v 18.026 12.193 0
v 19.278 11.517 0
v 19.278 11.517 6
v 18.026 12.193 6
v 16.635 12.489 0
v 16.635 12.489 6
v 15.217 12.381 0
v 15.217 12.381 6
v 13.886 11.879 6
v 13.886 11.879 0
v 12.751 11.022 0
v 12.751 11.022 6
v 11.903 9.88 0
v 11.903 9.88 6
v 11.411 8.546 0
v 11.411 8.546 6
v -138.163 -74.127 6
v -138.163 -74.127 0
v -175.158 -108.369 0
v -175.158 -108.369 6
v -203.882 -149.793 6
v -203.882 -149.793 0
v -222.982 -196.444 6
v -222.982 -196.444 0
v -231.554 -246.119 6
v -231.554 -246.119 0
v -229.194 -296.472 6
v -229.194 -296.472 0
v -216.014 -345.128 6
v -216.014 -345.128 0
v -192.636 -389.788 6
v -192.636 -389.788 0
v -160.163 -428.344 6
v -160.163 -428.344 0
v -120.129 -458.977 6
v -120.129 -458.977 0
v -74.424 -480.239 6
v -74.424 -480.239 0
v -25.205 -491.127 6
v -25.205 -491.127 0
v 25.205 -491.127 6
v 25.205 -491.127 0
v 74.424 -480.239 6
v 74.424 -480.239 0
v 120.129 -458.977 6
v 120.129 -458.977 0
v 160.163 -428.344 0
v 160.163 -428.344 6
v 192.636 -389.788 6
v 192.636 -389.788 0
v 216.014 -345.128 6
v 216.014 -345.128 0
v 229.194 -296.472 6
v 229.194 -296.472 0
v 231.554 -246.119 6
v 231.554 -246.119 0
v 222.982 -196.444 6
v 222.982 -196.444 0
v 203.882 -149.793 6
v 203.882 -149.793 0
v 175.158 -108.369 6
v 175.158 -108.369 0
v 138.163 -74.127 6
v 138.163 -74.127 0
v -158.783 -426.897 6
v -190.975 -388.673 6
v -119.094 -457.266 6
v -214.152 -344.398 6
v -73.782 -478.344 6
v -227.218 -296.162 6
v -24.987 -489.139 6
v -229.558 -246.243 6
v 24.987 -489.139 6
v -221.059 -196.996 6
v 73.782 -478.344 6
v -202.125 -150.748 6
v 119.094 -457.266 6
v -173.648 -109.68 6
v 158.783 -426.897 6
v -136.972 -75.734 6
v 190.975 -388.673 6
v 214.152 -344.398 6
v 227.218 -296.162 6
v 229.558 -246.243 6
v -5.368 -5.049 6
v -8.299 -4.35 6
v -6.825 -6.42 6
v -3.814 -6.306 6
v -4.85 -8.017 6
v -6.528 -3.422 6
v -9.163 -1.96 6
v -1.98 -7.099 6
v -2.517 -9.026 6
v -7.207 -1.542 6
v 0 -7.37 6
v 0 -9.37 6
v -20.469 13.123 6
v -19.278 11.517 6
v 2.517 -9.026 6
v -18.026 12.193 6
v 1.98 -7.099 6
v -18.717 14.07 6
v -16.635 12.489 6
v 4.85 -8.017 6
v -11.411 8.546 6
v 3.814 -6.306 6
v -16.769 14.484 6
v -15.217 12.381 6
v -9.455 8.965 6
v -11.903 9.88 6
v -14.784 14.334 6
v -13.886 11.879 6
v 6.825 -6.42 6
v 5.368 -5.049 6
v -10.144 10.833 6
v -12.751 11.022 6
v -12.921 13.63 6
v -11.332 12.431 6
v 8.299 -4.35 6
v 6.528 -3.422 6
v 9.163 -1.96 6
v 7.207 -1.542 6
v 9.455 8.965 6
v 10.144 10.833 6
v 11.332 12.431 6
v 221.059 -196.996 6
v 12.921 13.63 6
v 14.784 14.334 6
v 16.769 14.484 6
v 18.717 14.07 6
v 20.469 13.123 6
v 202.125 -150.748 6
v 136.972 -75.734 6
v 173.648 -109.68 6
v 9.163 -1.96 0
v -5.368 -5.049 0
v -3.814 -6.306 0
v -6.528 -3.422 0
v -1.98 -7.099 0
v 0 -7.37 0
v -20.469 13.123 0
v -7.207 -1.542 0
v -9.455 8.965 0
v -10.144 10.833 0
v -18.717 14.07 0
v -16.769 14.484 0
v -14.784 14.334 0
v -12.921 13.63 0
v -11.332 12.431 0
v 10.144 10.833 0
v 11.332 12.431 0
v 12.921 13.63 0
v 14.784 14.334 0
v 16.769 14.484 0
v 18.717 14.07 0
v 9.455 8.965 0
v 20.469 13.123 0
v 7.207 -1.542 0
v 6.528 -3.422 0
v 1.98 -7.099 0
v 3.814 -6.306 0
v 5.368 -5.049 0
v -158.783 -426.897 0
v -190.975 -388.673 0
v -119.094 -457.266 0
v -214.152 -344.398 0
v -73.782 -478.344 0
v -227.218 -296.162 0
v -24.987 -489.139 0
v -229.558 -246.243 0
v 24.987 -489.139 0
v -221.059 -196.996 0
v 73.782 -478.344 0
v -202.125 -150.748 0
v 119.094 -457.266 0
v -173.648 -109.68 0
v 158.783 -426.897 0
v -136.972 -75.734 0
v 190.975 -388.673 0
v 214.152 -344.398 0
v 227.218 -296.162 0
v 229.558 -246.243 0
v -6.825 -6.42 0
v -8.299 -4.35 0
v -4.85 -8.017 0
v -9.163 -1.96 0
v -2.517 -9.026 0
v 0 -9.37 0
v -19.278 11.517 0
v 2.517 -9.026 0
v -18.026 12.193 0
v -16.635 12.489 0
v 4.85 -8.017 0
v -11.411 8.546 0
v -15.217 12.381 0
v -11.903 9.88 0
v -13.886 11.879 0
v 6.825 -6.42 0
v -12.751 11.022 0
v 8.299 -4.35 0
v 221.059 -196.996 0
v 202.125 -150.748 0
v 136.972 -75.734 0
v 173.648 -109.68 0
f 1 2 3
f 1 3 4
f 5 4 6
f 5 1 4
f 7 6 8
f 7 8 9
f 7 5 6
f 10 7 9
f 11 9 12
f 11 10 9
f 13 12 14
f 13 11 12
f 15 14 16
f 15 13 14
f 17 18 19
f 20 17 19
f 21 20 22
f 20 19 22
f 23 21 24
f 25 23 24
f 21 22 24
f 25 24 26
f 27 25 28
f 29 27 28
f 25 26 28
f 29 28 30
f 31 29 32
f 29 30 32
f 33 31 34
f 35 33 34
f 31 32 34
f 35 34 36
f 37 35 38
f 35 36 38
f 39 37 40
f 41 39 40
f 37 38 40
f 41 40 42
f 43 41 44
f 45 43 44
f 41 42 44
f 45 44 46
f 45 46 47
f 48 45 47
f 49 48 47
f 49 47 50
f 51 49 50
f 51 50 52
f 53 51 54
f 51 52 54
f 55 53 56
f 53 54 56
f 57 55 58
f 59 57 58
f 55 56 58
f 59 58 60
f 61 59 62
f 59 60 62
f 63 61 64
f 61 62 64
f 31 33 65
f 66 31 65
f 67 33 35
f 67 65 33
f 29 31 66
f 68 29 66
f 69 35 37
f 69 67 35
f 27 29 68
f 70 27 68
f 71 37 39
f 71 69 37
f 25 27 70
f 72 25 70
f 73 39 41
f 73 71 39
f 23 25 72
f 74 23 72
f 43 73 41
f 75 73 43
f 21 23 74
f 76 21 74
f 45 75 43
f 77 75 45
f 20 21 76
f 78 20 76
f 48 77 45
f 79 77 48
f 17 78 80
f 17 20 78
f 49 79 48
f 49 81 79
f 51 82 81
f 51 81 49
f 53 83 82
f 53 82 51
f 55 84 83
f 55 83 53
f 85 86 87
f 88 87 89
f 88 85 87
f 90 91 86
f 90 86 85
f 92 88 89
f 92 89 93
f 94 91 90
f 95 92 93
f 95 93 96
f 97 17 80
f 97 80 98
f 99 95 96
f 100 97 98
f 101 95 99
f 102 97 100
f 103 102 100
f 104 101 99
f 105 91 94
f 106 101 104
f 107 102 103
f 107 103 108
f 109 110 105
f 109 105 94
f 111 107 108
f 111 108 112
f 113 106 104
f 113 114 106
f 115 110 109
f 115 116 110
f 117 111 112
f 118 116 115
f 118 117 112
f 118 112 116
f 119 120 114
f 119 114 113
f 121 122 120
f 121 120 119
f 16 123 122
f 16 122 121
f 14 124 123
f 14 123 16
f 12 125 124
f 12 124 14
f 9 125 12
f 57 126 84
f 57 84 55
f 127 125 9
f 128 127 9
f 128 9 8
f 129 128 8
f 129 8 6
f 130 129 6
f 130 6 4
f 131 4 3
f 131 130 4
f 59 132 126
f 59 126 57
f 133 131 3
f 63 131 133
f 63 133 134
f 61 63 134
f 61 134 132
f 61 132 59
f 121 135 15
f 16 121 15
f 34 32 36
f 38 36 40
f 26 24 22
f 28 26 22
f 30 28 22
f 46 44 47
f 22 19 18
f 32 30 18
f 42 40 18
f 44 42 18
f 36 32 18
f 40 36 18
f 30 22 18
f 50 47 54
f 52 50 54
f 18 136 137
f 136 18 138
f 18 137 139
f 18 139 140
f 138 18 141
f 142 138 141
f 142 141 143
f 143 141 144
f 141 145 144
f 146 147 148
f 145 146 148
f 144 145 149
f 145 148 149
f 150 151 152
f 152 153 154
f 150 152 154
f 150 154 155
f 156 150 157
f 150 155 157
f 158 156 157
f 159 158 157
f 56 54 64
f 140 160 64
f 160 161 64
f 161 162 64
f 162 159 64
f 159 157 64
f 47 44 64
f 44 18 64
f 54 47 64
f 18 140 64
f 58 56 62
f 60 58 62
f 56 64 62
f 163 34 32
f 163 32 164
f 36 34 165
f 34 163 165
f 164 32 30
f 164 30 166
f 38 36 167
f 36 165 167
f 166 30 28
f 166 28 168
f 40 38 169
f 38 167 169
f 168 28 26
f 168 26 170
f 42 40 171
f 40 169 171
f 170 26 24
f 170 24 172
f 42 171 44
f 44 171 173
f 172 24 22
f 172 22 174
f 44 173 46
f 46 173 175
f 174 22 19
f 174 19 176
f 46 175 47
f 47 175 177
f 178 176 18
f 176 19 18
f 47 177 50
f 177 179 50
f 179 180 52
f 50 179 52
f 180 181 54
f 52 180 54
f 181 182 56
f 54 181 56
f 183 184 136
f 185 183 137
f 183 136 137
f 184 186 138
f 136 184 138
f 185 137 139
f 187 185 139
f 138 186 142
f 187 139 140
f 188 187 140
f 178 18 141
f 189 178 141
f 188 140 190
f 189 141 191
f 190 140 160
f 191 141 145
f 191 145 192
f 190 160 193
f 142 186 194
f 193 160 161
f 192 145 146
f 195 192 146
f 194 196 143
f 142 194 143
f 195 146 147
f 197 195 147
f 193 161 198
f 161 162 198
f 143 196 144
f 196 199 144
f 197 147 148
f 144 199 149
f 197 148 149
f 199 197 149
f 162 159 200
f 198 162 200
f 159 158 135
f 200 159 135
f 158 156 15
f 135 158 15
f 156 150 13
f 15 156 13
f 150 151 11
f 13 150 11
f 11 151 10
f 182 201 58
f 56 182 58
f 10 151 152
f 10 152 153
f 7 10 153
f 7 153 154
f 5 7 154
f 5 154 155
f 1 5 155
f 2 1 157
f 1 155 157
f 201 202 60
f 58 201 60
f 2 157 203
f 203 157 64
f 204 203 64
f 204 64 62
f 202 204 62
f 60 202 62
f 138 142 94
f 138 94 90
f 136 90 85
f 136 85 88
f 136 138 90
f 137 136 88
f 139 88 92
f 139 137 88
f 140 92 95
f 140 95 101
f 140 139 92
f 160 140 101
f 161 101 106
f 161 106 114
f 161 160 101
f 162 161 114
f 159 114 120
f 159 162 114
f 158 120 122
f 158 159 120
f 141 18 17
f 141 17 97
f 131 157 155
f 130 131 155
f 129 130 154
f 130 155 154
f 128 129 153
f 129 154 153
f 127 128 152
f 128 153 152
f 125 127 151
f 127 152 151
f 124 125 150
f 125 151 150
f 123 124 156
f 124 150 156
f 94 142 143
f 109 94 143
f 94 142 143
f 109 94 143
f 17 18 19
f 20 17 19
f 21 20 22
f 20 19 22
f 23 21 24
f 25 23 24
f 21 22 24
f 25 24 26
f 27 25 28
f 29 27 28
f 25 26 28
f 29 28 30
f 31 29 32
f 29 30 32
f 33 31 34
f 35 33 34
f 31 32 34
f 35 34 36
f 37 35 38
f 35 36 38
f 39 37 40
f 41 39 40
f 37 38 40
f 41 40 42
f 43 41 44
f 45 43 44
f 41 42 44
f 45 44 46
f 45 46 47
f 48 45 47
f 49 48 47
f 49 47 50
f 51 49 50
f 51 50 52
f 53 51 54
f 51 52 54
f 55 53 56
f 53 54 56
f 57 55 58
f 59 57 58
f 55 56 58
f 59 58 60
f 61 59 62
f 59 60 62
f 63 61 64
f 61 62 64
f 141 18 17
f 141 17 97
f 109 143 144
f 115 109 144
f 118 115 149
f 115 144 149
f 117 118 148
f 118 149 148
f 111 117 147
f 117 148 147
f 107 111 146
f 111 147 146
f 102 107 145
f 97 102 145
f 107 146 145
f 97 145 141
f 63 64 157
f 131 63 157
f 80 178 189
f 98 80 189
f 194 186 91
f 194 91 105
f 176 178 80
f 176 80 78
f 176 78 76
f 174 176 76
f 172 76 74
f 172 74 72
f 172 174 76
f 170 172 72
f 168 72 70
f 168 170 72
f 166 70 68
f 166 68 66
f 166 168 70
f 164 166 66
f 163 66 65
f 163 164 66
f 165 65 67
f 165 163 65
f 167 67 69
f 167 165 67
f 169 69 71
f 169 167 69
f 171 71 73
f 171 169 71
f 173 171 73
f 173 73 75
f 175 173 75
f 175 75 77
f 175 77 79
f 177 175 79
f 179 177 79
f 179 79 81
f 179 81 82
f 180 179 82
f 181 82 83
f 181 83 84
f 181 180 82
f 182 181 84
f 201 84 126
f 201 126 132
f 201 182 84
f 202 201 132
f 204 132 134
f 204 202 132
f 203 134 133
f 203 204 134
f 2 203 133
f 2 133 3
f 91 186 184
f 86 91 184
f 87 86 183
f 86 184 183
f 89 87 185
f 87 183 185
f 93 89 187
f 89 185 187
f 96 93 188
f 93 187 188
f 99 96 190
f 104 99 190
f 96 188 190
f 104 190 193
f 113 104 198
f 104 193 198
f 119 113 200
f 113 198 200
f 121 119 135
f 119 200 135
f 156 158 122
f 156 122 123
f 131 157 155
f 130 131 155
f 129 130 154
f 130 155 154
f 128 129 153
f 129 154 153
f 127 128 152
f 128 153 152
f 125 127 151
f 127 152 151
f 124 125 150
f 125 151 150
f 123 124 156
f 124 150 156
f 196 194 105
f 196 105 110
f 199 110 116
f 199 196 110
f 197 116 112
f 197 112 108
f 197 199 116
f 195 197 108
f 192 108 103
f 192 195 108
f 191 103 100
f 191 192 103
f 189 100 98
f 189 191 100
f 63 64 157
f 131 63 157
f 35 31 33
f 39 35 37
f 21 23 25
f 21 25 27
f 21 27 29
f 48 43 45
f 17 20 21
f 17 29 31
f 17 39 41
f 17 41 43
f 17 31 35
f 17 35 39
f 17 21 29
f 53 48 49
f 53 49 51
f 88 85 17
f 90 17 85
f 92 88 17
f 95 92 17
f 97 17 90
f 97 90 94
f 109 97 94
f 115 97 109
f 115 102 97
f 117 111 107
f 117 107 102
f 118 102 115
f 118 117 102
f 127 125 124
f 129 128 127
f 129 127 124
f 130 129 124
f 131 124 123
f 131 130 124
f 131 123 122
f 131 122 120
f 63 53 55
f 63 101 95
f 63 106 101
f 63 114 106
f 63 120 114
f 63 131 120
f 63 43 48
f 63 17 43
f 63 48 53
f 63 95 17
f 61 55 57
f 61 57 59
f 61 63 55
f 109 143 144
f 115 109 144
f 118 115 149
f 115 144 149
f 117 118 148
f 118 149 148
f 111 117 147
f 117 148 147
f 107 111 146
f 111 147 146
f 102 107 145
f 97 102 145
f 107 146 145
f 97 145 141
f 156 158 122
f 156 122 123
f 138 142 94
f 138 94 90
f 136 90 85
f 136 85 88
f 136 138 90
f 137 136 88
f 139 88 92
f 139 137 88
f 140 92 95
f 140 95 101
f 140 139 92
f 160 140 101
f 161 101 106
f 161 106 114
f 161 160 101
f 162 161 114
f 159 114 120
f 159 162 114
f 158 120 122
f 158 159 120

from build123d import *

# Parameters (mm, degrees)
PAD_DEPTH    = 6
PAD001_DEPTH = 6


with BuildPart() as perimetercalc:
    # Sketch → Pad (new body)
    with BuildSketch(Plane.XY):
        with BuildLine():
            ThreePointArc((-138.163471, -74.127107), (0, -492.5), (138.163471, -74.127107))
            Line((138.163471, -74.127107), (20.468725, 13.12332))
            ThreePointArc((20.468725, 13.12332), (13.827265, 14.048708), (9.454935, 8.964609))
            Line((7.206876, -1.542024), (9.454935, 8.964609))
            ThreePointArc((-7.206876, -1.542024), (0, -7.37), (7.206876, -1.542024))
            Line((-7.206876, -1.542024), (-9.454935, 8.964609))
            ThreePointArc((-9.454935, 8.964609), (-13.827265, 14.048708), (-20.468725, 13.12332))
            Line((-138.163471, -74.127107), (-20.468725, 13.12332))
        make_face()
    extrude(amount=PAD_DEPTH)


with BuildPart() as body001:
    # Sketch001 → Pad001 (new body)
    with BuildSketch(Plane.XY):
        with BuildLine():
            ThreePointArc((-138.163471, -74.127107), (0, -492.5), (138.163471, -74.127107))
            Line((138.163471, -74.127107), (20.468725, 13.12332))
            ThreePointArc((20.468725, 13.12332), (13.827265, 14.048708), (9.454935, 8.964609))
            Line((7.206876, -1.542024), (9.454935, 8.964609))
            ThreePointArc((-7.206876, -1.542024), (0, -7.37), (7.206876, -1.542024))
            Line((-7.206876, -1.542024), (-9.454935, 8.964609))
            ThreePointArc((-9.454935, 8.964609), (-13.827265, 14.048708), (-20.468725, 13.12332))
            Line((-138.163471, -74.127107), (-20.468725, 13.12332))
        make_face()
        with BuildLine():
            ThreePointArc((-136.972406, -75.733769), (0, -490.5), (136.972406, -75.733769))
            Line((136.972406, -75.733769), (19.277661, 11.516657))
            ThreePointArc((19.277661, 11.516657), (14.533761, 12.177649), (11.410668, 8.546149))
            Line((9.162609, -1.960484), (11.410668, 8.546149))
            ThreePointArc((-9.162609, -1.960484), (0, -9.37), (9.162609, -1.960484))
            Line((-9.162609, -1.960484), (-11.410668, 8.546149))
            ThreePointArc((-11.410668, 8.546149), (-14.533761, 12.177649), (-19.277661, 11.516657))
            Line((-136.972406, -75.733769), (-19.277661, 11.516657))
        make_face(mode=Mode.SUBTRACT)
    extrude(amount=PAD001_DEPTH)


solid = Compound([perimetercalc.part, body001.part])
